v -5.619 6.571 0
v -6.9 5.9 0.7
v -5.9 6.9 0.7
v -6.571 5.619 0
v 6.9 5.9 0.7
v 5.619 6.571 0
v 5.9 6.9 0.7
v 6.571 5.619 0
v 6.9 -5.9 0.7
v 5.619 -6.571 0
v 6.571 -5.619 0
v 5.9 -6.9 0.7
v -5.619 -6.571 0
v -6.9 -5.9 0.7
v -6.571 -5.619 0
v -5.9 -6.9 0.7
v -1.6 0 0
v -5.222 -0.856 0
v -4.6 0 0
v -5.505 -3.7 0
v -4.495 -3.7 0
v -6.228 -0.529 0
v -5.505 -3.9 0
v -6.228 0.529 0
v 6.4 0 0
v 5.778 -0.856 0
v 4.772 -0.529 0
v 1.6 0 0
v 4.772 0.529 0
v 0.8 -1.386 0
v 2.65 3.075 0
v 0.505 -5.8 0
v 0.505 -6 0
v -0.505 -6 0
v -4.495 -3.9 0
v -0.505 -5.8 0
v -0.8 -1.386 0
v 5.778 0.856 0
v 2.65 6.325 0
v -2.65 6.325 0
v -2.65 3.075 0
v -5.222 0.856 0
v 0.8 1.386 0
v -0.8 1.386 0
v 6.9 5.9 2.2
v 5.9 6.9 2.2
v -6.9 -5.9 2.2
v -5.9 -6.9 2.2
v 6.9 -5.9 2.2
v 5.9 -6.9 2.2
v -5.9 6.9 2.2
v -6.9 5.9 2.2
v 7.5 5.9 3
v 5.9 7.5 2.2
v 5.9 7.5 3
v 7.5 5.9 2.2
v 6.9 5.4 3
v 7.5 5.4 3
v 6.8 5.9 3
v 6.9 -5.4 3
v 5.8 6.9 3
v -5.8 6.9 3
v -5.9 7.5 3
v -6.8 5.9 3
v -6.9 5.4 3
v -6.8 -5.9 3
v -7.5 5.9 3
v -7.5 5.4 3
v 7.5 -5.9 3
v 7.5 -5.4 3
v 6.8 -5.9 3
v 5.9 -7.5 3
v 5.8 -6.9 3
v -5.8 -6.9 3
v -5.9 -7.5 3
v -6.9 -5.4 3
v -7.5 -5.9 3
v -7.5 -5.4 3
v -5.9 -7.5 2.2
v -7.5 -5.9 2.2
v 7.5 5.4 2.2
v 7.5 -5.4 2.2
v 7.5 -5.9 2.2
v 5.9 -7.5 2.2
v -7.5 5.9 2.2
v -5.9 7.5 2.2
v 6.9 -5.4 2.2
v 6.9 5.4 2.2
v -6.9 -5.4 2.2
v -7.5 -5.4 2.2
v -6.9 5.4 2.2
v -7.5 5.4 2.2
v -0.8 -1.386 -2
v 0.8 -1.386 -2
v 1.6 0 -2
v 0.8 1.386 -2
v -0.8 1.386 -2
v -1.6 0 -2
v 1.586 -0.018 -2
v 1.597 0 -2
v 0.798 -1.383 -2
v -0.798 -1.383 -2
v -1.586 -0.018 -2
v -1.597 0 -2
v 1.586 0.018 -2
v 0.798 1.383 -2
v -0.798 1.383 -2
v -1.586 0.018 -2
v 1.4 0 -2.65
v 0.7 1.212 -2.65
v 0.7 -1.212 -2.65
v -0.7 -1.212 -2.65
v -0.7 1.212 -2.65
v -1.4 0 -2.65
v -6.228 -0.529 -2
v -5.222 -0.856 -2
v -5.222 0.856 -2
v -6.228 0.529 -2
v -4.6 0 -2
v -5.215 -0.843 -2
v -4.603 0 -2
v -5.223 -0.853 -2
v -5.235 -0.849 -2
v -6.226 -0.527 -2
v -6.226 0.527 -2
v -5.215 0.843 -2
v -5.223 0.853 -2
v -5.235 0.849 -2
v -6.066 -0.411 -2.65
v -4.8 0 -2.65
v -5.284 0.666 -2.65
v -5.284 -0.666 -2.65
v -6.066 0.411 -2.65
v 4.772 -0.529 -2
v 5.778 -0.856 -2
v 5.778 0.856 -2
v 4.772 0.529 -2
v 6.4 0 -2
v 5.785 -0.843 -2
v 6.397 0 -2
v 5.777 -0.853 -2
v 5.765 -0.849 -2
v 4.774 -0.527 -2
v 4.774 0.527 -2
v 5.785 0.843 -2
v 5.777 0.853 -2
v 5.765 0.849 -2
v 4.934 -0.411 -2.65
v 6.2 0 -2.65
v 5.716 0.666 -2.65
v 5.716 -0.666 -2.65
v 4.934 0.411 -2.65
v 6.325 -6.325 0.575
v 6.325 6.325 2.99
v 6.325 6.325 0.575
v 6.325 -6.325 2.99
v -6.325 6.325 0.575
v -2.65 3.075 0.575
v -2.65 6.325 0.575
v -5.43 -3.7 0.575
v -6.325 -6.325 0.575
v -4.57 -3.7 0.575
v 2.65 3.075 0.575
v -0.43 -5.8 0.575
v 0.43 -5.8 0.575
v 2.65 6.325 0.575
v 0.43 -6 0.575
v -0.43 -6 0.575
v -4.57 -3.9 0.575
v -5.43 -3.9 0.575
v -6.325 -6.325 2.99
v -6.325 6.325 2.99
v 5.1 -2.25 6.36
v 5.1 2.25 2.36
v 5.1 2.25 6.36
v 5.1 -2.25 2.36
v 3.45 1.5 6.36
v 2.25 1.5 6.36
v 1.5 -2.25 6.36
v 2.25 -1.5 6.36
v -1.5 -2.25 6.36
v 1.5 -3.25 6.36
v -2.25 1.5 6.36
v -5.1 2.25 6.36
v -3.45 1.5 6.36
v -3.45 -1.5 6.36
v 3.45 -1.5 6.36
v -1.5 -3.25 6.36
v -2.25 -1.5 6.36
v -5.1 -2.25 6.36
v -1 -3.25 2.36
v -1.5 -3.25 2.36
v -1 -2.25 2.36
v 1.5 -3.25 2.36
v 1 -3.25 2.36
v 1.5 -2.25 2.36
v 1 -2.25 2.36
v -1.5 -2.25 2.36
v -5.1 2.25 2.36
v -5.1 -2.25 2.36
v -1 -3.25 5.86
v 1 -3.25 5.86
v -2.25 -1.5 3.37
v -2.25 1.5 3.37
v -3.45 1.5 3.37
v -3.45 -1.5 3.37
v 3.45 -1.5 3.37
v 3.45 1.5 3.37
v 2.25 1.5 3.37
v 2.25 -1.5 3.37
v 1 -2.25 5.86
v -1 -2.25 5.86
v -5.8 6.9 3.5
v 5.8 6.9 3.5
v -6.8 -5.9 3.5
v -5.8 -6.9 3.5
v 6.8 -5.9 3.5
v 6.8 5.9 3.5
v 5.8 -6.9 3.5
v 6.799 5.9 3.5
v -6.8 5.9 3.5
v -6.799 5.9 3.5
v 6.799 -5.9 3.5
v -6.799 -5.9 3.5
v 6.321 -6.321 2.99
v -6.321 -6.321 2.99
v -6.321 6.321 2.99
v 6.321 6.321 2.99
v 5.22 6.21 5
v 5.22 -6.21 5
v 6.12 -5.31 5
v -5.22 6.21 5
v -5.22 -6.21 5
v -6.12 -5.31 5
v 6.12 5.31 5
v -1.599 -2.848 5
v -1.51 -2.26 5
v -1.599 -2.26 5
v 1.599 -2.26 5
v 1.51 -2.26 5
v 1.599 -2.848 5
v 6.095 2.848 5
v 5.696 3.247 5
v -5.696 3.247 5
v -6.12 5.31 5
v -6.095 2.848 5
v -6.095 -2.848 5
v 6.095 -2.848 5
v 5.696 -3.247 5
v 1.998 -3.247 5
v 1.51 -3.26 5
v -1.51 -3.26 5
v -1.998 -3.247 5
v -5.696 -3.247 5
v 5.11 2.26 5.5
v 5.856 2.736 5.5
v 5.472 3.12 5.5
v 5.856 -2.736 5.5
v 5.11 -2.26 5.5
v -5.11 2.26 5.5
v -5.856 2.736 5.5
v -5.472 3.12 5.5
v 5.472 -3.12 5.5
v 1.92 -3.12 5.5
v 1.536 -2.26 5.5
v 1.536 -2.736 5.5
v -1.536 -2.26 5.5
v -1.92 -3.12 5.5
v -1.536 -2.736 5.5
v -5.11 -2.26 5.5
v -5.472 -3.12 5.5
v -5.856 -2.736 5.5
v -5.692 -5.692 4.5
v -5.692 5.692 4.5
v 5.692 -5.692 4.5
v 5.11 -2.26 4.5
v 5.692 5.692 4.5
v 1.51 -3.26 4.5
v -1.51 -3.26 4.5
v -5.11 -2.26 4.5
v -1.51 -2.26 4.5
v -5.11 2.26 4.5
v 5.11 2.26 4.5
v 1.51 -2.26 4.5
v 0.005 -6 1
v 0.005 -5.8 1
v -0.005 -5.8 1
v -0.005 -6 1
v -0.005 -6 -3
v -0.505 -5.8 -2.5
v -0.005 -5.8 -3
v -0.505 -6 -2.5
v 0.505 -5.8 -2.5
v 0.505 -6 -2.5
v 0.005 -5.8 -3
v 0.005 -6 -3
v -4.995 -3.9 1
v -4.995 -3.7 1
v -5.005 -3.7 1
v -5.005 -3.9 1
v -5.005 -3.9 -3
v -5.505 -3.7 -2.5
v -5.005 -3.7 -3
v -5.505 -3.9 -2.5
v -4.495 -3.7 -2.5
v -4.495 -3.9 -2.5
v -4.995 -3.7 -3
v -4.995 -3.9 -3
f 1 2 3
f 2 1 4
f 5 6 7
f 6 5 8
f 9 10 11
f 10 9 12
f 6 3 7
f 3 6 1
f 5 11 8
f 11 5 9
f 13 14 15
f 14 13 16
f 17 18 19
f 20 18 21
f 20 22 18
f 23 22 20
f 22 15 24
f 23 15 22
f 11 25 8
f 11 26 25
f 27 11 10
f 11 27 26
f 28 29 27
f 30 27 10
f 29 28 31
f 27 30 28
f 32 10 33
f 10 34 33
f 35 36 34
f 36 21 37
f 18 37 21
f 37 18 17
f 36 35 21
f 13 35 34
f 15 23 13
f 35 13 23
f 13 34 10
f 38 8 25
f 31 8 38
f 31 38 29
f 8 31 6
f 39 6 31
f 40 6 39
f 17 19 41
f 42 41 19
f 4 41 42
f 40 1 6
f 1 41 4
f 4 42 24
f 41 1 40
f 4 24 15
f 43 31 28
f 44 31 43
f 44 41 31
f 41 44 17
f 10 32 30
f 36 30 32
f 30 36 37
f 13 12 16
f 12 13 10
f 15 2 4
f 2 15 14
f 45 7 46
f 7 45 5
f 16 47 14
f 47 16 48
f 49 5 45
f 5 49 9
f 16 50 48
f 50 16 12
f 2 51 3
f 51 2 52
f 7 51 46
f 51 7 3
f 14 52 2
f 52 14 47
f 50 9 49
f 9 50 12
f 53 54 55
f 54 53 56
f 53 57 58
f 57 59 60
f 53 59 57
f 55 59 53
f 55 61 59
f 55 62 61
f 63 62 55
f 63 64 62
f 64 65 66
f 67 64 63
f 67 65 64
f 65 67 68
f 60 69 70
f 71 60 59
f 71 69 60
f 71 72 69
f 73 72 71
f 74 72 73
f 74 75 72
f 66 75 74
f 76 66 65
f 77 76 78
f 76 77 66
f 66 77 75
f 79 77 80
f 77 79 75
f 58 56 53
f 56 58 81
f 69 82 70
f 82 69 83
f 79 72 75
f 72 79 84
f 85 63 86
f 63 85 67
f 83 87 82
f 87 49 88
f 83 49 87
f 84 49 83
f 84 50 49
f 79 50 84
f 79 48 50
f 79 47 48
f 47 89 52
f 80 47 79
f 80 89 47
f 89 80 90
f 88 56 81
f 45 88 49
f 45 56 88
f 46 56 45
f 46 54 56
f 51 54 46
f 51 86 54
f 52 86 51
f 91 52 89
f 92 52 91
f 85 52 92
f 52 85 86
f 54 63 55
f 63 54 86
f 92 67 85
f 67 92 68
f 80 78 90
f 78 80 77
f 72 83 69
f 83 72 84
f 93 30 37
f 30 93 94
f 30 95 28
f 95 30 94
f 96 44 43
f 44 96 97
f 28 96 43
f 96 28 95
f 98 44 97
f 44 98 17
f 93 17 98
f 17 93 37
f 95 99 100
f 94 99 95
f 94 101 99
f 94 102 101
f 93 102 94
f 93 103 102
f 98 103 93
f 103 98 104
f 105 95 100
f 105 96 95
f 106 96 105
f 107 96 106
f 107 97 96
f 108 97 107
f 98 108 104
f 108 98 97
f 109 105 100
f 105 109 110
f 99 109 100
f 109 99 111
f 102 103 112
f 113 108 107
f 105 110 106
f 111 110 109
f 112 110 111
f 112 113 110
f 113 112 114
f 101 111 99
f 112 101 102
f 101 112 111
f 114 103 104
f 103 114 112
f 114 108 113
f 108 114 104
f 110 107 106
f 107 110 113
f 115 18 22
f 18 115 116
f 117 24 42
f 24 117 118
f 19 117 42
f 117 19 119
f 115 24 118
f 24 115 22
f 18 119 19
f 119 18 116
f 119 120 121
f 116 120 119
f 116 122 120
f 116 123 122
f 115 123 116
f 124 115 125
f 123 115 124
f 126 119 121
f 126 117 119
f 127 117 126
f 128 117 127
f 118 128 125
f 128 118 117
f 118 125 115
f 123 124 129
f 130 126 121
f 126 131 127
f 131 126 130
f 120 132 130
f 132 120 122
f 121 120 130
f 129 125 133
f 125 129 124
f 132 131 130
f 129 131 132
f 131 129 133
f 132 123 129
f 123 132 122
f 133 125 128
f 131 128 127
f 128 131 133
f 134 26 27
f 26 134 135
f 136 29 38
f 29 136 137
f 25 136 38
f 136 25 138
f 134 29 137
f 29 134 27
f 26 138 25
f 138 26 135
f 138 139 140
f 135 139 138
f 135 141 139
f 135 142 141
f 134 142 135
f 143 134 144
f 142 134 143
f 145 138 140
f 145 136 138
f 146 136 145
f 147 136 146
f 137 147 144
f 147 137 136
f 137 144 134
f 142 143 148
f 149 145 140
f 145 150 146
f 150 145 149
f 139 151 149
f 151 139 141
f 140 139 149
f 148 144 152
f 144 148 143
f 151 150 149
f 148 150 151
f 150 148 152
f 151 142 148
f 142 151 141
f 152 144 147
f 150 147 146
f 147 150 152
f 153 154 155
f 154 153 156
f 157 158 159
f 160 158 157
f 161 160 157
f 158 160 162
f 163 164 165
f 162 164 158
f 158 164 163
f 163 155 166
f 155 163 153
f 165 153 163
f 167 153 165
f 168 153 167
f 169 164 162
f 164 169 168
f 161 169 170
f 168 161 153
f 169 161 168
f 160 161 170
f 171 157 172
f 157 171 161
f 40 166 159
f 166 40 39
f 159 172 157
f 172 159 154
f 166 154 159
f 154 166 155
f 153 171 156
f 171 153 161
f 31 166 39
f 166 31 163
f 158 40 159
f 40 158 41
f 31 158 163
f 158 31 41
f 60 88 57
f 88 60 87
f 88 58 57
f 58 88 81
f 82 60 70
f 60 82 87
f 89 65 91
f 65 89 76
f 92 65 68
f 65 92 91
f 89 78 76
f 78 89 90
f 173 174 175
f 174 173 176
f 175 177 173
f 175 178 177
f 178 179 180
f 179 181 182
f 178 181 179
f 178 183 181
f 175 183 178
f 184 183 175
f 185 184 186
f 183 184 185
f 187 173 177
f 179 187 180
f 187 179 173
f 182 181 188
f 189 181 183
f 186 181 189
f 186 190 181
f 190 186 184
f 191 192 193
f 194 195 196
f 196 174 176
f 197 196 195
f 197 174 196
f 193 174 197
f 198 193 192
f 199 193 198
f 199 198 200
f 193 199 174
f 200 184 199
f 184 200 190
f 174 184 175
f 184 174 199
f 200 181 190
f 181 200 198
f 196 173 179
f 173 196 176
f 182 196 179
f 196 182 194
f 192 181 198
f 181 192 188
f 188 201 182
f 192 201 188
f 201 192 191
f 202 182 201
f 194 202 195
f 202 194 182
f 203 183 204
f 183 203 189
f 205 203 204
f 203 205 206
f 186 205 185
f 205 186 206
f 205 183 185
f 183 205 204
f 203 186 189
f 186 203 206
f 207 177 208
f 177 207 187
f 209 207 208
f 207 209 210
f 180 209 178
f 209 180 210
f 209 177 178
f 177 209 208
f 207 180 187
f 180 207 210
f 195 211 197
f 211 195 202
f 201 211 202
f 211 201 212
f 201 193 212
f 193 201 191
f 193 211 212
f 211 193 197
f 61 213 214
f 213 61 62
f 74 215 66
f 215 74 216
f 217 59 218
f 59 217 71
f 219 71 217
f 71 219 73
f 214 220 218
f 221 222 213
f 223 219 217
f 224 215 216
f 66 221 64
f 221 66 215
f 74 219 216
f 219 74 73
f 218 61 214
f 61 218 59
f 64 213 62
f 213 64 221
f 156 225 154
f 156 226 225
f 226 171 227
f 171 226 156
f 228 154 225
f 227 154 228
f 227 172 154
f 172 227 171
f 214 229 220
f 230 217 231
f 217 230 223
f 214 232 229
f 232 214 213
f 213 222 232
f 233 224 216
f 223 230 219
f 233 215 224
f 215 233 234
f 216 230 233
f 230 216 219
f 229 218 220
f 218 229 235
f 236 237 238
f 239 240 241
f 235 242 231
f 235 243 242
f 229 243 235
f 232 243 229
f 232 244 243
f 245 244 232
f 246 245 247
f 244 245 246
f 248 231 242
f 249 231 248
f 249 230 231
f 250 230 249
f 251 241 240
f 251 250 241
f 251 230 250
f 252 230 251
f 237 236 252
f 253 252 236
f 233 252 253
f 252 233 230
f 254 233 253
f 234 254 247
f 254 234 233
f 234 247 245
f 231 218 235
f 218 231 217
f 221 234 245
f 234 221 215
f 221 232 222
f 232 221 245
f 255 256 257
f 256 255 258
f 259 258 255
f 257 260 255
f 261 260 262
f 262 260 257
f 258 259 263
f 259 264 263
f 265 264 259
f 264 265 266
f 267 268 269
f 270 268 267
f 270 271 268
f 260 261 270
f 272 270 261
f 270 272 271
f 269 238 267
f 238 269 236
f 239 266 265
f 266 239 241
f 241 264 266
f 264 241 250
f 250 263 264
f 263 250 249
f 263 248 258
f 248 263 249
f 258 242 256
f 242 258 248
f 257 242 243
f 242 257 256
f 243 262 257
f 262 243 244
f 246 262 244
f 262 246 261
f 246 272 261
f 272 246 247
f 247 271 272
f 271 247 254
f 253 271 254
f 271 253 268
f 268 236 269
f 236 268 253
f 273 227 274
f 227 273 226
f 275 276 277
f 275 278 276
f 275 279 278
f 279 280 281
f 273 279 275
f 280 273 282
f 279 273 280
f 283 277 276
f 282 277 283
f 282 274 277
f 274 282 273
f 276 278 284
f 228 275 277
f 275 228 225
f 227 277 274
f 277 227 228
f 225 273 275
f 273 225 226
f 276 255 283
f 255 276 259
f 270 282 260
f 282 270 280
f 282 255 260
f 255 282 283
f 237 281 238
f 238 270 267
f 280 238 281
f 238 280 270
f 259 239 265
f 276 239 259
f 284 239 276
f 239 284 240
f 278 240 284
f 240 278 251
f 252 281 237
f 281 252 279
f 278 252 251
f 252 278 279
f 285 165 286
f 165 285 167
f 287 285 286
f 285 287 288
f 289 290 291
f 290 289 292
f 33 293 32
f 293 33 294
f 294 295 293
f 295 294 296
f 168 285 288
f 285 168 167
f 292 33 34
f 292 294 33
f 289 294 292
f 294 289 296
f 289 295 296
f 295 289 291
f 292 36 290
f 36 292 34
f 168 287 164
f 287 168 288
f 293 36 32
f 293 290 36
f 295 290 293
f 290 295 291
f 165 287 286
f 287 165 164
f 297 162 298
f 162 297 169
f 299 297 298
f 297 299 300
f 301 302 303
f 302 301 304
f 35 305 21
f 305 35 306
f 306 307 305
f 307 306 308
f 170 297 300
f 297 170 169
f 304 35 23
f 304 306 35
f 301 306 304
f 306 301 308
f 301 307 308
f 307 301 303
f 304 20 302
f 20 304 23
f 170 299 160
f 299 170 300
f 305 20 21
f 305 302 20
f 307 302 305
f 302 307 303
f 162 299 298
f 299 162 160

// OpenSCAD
/*******************************************************************************\
|						Kailh Choc V1 and V2 switch models.						|
|							Copyright 2026 Felix Kuehling 						|
|																				|
|	This program is free software: you can redistribute it and/or modify		|
|	it under the terms of the GNU General Public License as published by		|
|	the Free Software Foundation, either version 3 of the License, or			|
|	(at your option) any later version.											|
|	This program is distributed in the hope that it will be useful,				|
|	but WITHOUT ANY WARRANTY; without even the implied warranty of				|
|	MERCHANTABILITY or FITNESS FOR A PARTICULAR PURPOSE.  See the				|
|	GNU General Public License for more details.								|
|	You should have received a copy of the GNU General Public License			|
|	along with this program.  If not, see <https://www.gnu.org/licenses/>.		|
|																				|
\*******************************************************************************/

travel = 3.3 * (0.5 * sin ( 360 * $t) + 0.5);
$color_scheme = 6;
$choc_version = 1;

choc_switch();
//choc_switch_v1 ( bottom_color, top_color, stem_color );

module choc_switch_v1(bottom_color, top_color, stem_color,travel=travel) {
    color(bottom_color) render(convexity = 4) difference() {
        union() {
            linear_extrude(height = 0.701, scale = 1.05) {
                offset(r = 1.0/1.05) square(11.8/1.05, center = true);
            }
            translate([0, 0, 0.7]) linear_extrude(height = 1.51) {
                offset(r = 1.0) square(11.8, center = true);
            }
            translate([0, 0, 2.2]) linear_extrude(height = 0.8) {
                offset(r = 1.6) square(11.8, center = true);
            }
            translate([0, 0, -2]) cylinder(h = 2.01, d = 3.2);
            translate([0, 0, -2.65]) cylinder(h = 0.66, d1 = 2.8, d2 = 3.2);
            translate([-5.5, 0, -2   ]) cylinder(h = 2.01, d = 1.8);
            translate([-5.5, 0, -2.65]) cylinder(h = 0.66, d1 = 1.4, d2 = 1.8);
            translate([ 5.5, 0, -2   ]) cylinder(h = 2.01, d = 1.8);
            translate([ 5.5, 0, -2.65]) cylinder(h = 0.66, d1 = 1.4, d2 = 1.8);
        }
        translate([0, 0, 6.9]) cube(12.65, center = true);
        translate([0, 4.7, 0]) cube([5.3, 3.25, 2], center = true);
        translate([7.4, 0, 2.5]) cube([1, 10.8, 1], center = true);
        translate([-7.4, 0, 2.5]) cube([1, 10.8, 1], center = true);
    }
    color("gold") translate([0, -5.9, -1]) rotate([90, 0, 0])
    linear_extrude(height = 0.2, center = true) {
        offset(r = 0.5) square([0.01, 3], center = true);
    }
    color("silver") translate([-5, -3.8, -1]) rotate([90, 0, 0])
    linear_extrude(height = 0.2, center = true) {
        offset(r = 0.5) square([0.01, 3], center = true);
    }
    color(stem_color) translate([0, 0, 5+1.01-travel]) render(convexity = 4) difference() {
        union() {
            cube([10.2, 4.5, 4], center = true);
            translate([0, -2.74, 0]) cube([3, 1.02, 4], center = true);
        }
        translate([-2.85, 0, 0.51]) cube([1.2, 3, 3], center = true);
        translate([ 2.85, 0, 0.51]) cube([1.2, 3, 3], center = true);
        translate([0, -2.76, -0.5]) cube([2, 1.02, 4], center = true);
    }
    color(top_color, 0.3) render(convexity = 4) difference() {
        union() {
            translate([0, 0, 2.99])
            linear_extrude(height = 0.51) {
                offset(r = 1.0) square([11.6, 11.8], center = true);
            }
            translate([0, 0, 3.499])
            linear_extrude(height = 1.501, scale = 0.9) {
                offset(r = 1.0) square([11.6, 11.8], center = true);
            }
            translate([0, 0, 4.99])
            linear_extrude(height = 0.51, convexity = 2, scale = 0.96) {
                offset(r = 0.4) polygon([
                [-5.7, -2.85], [-5.7,  2.85], [ 5.7,  2.85], [ 5.7, -2.85],
                [ 2.0, -2.85], [ 2.0, -1.85], [-2.0, -1.85], [-2.0, -2.85]
                ]);
            }
        }
        translate([0, 0, 2.98])
        linear_extrude(height = 1.52, scale = 0.9) {
            square(12.65, center = true);
        }
        translate([0, 0, 5]) cube([10.22, 4.52, 2], center = true);
        translate([0, -2.74, 5]) cube([3.02, 1.04, 2], center = true);
    }
}

module choc_switch_v2(bottom_color, top_color, stem_color, travel=travel) {
    color(bottom_color) render(convexity = 4) difference() {
        union() {
            linear_extrude(height = 0.701, scale = 1.05) {
                offset(r = 1.0/1.05) square(11.95/1.05, center = true);
            }
            translate([0, 0, 0.7]) linear_extrude(height = 1.51) {
                offset(r = 1.0) square(11.95, center = true);
            }
            translate([0, 0, 2.2]) linear_extrude(height = 0.8) {
                offset(r = 1.5) square(12.0, center = true);
            }
            translate([0, 0, -2]) cylinder(h = 2.01, d = 4.8);
            translate([0, 0, -2.65]) cylinder(h = 0.66, d1 = 2.8, d2 = 4.8);
        }
        translate([0, 0, 6.9]) cube(12.8, center = true);
        translate([0, 4.7, 0]) cube([5.3, 3.25, 2], center = true);
        translate([7.475, 0, 2.5]) cube([1, 10.8, 1], center = true);
        translate([-7.475, 0, 2.5]) cube([1, 10.8, 1], center = true);
    }
    color("gold") translate([0, -5.9, -1]) rotate([90, 0, 0])
    linear_extrude(height = 0.2, center = true) {
        offset(r = 0.5) square([0.01, 3], center = true);
    }
    color("silver") translate([-5, -3.8, -1]) rotate([90, 0, 0])
    linear_extrude(height = 0.2, center = true) {
        offset(r = 0.5) square([0.01, 3], center = true);
    }
    color("silver") translate([5, 5.15, -1]) rotate([90, 0, 0])
    linear_extrude(height = 0.2, center = true) {
        offset(r = 0.5) square([0.01, 3], center = true);
    }
    color(stem_color) translate([0, 0, 5.3+3.3-2-travel]) render(convexity = 4)
    union() {
        difference() {
            cylinder(h=4, d=6.5, center=true);
            translate([0, 0, 0.4]) cylinder(h=4, d=5.6, center=true);
        }
        cube([4, 1.1, 4], center=true);
        cube([1.3, 4, 4], center=true);
    }
    color(top_color, 0.3) render(convexity = 4) difference() {
        union() {
            translate([0, 0, 2.99])
            linear_extrude(height = 0.81) {
                offset(r = 1.0) square(11.95, center = true);
            }
            translate([0, 0, 3.799])
            linear_extrude(height = 1.501, scale = 0.9) {
                offset(r = 1.0) square(11.95, center = true);
            }
        }
        translate([0, 0, 2.98])
        linear_extrude(height = 1.82, scale = 0.9) {
            square(12.8, center = true);
        }
        translate([0, 0, 5]) cylinder(h=2, d=6.6, center=true);
    }
}

module choc_switch(travel=travel) {
    bottom_color =
        $color_scheme == 1 ? "mediumblue" :
        $color_scheme == 2 ? "dimgrey" :
        $color_scheme == 3 ? "red" :
        $color_scheme == 4 ? "lightgrey" :
        $color_scheme == 5 ? "#9ef" :
        $color_scheme == 6 ? "#333" :
        $color_scheme == 7 ? "#333" :
        $color_scheme == 8 ? "#333" :
        $color_scheme == 9 ? "#333" :
        $color_scheme ==10 ? "darkblue" :
                             "dimgrey";
    top_color =
        $color_scheme == 1 ? "white" :
        $color_scheme == 2 ? "white" :
        $color_scheme == 3 ? "white" :
        $color_scheme == 4 ? "white" :
        $color_scheme == 5 ? "white" :
        $color_scheme == 6 ? "#333" :
        $color_scheme == 7 ? "#383034" :
        $color_scheme == 8 ? "#383034" :
        $color_scheme == 9 ? "#412" :
        $color_scheme ==10 ? "deepskyblue" :
                             "white";
    stem_color =
        $color_scheme == 1 ? "deepskyblue" :
        $color_scheme == 2 ? "sienna" :
        $color_scheme == 3 ? "white" :
        $color_scheme == 4 ? "lightpink" :
        $color_scheme == 5 ? "#9ff" :
        $color_scheme == 6 ? "darkorange" :
        $color_scheme == 7 ? "lightgreen" :
        $color_scheme == 8 ? "#222" :
        $color_scheme == 9 ? "lightsalmon" :
        $color_scheme ==10 ? "red" :
                             "red";

    if ($choc_version == 2)
        choc_switch_v2(bottom_color, top_color, stem_color, travel=travel);
    else
        choc_switch_v1(bottom_color, top_color, stem_color, travel=travel);
}

function choc_color_name_to_number ( name ) = (
    name == "Blue"      ? 1 :
    name == "Brown"     ? 2 :
    name == "Pro Red"   ? 3 :
    name == "Pink"      ? 4 :
    name == "Robin"     ? 5 :
    name == "Sunset"    ? 6 :
    name == "Twilight"  ? 7 :
    name == "Nocturnal" ? 8 :
    name == "Sunrise"   ? 9 :
    name == "Bokeh"     ? 10 :
    0 // Red
);


// Expanded switch-top for cutting away from key-cap bottom
module switch_top(margin = 0.1) {
    size       = $choc_version == 2 ? [11.95, 11.95] : [11.6, 11.8];
    max_travel = $choc_version == 2 ? 3.3 : 3;
    insertion = ($choc_version == 2 ? $droop : $droop - 0.5) + margin;
    $fn = 20;

    translate([0, 0, insertion - 10])
        linear_extrude(height = 8.5) {
            offset(r = 1.0 + margin) square(size, center = true);
        }
    translate([0, 0, insertion - 1.501])
        linear_extrude(height = 1.501, scale = 0.9) {
            offset(r = 1.0 + margin) square(size, center = true);
        }
}
